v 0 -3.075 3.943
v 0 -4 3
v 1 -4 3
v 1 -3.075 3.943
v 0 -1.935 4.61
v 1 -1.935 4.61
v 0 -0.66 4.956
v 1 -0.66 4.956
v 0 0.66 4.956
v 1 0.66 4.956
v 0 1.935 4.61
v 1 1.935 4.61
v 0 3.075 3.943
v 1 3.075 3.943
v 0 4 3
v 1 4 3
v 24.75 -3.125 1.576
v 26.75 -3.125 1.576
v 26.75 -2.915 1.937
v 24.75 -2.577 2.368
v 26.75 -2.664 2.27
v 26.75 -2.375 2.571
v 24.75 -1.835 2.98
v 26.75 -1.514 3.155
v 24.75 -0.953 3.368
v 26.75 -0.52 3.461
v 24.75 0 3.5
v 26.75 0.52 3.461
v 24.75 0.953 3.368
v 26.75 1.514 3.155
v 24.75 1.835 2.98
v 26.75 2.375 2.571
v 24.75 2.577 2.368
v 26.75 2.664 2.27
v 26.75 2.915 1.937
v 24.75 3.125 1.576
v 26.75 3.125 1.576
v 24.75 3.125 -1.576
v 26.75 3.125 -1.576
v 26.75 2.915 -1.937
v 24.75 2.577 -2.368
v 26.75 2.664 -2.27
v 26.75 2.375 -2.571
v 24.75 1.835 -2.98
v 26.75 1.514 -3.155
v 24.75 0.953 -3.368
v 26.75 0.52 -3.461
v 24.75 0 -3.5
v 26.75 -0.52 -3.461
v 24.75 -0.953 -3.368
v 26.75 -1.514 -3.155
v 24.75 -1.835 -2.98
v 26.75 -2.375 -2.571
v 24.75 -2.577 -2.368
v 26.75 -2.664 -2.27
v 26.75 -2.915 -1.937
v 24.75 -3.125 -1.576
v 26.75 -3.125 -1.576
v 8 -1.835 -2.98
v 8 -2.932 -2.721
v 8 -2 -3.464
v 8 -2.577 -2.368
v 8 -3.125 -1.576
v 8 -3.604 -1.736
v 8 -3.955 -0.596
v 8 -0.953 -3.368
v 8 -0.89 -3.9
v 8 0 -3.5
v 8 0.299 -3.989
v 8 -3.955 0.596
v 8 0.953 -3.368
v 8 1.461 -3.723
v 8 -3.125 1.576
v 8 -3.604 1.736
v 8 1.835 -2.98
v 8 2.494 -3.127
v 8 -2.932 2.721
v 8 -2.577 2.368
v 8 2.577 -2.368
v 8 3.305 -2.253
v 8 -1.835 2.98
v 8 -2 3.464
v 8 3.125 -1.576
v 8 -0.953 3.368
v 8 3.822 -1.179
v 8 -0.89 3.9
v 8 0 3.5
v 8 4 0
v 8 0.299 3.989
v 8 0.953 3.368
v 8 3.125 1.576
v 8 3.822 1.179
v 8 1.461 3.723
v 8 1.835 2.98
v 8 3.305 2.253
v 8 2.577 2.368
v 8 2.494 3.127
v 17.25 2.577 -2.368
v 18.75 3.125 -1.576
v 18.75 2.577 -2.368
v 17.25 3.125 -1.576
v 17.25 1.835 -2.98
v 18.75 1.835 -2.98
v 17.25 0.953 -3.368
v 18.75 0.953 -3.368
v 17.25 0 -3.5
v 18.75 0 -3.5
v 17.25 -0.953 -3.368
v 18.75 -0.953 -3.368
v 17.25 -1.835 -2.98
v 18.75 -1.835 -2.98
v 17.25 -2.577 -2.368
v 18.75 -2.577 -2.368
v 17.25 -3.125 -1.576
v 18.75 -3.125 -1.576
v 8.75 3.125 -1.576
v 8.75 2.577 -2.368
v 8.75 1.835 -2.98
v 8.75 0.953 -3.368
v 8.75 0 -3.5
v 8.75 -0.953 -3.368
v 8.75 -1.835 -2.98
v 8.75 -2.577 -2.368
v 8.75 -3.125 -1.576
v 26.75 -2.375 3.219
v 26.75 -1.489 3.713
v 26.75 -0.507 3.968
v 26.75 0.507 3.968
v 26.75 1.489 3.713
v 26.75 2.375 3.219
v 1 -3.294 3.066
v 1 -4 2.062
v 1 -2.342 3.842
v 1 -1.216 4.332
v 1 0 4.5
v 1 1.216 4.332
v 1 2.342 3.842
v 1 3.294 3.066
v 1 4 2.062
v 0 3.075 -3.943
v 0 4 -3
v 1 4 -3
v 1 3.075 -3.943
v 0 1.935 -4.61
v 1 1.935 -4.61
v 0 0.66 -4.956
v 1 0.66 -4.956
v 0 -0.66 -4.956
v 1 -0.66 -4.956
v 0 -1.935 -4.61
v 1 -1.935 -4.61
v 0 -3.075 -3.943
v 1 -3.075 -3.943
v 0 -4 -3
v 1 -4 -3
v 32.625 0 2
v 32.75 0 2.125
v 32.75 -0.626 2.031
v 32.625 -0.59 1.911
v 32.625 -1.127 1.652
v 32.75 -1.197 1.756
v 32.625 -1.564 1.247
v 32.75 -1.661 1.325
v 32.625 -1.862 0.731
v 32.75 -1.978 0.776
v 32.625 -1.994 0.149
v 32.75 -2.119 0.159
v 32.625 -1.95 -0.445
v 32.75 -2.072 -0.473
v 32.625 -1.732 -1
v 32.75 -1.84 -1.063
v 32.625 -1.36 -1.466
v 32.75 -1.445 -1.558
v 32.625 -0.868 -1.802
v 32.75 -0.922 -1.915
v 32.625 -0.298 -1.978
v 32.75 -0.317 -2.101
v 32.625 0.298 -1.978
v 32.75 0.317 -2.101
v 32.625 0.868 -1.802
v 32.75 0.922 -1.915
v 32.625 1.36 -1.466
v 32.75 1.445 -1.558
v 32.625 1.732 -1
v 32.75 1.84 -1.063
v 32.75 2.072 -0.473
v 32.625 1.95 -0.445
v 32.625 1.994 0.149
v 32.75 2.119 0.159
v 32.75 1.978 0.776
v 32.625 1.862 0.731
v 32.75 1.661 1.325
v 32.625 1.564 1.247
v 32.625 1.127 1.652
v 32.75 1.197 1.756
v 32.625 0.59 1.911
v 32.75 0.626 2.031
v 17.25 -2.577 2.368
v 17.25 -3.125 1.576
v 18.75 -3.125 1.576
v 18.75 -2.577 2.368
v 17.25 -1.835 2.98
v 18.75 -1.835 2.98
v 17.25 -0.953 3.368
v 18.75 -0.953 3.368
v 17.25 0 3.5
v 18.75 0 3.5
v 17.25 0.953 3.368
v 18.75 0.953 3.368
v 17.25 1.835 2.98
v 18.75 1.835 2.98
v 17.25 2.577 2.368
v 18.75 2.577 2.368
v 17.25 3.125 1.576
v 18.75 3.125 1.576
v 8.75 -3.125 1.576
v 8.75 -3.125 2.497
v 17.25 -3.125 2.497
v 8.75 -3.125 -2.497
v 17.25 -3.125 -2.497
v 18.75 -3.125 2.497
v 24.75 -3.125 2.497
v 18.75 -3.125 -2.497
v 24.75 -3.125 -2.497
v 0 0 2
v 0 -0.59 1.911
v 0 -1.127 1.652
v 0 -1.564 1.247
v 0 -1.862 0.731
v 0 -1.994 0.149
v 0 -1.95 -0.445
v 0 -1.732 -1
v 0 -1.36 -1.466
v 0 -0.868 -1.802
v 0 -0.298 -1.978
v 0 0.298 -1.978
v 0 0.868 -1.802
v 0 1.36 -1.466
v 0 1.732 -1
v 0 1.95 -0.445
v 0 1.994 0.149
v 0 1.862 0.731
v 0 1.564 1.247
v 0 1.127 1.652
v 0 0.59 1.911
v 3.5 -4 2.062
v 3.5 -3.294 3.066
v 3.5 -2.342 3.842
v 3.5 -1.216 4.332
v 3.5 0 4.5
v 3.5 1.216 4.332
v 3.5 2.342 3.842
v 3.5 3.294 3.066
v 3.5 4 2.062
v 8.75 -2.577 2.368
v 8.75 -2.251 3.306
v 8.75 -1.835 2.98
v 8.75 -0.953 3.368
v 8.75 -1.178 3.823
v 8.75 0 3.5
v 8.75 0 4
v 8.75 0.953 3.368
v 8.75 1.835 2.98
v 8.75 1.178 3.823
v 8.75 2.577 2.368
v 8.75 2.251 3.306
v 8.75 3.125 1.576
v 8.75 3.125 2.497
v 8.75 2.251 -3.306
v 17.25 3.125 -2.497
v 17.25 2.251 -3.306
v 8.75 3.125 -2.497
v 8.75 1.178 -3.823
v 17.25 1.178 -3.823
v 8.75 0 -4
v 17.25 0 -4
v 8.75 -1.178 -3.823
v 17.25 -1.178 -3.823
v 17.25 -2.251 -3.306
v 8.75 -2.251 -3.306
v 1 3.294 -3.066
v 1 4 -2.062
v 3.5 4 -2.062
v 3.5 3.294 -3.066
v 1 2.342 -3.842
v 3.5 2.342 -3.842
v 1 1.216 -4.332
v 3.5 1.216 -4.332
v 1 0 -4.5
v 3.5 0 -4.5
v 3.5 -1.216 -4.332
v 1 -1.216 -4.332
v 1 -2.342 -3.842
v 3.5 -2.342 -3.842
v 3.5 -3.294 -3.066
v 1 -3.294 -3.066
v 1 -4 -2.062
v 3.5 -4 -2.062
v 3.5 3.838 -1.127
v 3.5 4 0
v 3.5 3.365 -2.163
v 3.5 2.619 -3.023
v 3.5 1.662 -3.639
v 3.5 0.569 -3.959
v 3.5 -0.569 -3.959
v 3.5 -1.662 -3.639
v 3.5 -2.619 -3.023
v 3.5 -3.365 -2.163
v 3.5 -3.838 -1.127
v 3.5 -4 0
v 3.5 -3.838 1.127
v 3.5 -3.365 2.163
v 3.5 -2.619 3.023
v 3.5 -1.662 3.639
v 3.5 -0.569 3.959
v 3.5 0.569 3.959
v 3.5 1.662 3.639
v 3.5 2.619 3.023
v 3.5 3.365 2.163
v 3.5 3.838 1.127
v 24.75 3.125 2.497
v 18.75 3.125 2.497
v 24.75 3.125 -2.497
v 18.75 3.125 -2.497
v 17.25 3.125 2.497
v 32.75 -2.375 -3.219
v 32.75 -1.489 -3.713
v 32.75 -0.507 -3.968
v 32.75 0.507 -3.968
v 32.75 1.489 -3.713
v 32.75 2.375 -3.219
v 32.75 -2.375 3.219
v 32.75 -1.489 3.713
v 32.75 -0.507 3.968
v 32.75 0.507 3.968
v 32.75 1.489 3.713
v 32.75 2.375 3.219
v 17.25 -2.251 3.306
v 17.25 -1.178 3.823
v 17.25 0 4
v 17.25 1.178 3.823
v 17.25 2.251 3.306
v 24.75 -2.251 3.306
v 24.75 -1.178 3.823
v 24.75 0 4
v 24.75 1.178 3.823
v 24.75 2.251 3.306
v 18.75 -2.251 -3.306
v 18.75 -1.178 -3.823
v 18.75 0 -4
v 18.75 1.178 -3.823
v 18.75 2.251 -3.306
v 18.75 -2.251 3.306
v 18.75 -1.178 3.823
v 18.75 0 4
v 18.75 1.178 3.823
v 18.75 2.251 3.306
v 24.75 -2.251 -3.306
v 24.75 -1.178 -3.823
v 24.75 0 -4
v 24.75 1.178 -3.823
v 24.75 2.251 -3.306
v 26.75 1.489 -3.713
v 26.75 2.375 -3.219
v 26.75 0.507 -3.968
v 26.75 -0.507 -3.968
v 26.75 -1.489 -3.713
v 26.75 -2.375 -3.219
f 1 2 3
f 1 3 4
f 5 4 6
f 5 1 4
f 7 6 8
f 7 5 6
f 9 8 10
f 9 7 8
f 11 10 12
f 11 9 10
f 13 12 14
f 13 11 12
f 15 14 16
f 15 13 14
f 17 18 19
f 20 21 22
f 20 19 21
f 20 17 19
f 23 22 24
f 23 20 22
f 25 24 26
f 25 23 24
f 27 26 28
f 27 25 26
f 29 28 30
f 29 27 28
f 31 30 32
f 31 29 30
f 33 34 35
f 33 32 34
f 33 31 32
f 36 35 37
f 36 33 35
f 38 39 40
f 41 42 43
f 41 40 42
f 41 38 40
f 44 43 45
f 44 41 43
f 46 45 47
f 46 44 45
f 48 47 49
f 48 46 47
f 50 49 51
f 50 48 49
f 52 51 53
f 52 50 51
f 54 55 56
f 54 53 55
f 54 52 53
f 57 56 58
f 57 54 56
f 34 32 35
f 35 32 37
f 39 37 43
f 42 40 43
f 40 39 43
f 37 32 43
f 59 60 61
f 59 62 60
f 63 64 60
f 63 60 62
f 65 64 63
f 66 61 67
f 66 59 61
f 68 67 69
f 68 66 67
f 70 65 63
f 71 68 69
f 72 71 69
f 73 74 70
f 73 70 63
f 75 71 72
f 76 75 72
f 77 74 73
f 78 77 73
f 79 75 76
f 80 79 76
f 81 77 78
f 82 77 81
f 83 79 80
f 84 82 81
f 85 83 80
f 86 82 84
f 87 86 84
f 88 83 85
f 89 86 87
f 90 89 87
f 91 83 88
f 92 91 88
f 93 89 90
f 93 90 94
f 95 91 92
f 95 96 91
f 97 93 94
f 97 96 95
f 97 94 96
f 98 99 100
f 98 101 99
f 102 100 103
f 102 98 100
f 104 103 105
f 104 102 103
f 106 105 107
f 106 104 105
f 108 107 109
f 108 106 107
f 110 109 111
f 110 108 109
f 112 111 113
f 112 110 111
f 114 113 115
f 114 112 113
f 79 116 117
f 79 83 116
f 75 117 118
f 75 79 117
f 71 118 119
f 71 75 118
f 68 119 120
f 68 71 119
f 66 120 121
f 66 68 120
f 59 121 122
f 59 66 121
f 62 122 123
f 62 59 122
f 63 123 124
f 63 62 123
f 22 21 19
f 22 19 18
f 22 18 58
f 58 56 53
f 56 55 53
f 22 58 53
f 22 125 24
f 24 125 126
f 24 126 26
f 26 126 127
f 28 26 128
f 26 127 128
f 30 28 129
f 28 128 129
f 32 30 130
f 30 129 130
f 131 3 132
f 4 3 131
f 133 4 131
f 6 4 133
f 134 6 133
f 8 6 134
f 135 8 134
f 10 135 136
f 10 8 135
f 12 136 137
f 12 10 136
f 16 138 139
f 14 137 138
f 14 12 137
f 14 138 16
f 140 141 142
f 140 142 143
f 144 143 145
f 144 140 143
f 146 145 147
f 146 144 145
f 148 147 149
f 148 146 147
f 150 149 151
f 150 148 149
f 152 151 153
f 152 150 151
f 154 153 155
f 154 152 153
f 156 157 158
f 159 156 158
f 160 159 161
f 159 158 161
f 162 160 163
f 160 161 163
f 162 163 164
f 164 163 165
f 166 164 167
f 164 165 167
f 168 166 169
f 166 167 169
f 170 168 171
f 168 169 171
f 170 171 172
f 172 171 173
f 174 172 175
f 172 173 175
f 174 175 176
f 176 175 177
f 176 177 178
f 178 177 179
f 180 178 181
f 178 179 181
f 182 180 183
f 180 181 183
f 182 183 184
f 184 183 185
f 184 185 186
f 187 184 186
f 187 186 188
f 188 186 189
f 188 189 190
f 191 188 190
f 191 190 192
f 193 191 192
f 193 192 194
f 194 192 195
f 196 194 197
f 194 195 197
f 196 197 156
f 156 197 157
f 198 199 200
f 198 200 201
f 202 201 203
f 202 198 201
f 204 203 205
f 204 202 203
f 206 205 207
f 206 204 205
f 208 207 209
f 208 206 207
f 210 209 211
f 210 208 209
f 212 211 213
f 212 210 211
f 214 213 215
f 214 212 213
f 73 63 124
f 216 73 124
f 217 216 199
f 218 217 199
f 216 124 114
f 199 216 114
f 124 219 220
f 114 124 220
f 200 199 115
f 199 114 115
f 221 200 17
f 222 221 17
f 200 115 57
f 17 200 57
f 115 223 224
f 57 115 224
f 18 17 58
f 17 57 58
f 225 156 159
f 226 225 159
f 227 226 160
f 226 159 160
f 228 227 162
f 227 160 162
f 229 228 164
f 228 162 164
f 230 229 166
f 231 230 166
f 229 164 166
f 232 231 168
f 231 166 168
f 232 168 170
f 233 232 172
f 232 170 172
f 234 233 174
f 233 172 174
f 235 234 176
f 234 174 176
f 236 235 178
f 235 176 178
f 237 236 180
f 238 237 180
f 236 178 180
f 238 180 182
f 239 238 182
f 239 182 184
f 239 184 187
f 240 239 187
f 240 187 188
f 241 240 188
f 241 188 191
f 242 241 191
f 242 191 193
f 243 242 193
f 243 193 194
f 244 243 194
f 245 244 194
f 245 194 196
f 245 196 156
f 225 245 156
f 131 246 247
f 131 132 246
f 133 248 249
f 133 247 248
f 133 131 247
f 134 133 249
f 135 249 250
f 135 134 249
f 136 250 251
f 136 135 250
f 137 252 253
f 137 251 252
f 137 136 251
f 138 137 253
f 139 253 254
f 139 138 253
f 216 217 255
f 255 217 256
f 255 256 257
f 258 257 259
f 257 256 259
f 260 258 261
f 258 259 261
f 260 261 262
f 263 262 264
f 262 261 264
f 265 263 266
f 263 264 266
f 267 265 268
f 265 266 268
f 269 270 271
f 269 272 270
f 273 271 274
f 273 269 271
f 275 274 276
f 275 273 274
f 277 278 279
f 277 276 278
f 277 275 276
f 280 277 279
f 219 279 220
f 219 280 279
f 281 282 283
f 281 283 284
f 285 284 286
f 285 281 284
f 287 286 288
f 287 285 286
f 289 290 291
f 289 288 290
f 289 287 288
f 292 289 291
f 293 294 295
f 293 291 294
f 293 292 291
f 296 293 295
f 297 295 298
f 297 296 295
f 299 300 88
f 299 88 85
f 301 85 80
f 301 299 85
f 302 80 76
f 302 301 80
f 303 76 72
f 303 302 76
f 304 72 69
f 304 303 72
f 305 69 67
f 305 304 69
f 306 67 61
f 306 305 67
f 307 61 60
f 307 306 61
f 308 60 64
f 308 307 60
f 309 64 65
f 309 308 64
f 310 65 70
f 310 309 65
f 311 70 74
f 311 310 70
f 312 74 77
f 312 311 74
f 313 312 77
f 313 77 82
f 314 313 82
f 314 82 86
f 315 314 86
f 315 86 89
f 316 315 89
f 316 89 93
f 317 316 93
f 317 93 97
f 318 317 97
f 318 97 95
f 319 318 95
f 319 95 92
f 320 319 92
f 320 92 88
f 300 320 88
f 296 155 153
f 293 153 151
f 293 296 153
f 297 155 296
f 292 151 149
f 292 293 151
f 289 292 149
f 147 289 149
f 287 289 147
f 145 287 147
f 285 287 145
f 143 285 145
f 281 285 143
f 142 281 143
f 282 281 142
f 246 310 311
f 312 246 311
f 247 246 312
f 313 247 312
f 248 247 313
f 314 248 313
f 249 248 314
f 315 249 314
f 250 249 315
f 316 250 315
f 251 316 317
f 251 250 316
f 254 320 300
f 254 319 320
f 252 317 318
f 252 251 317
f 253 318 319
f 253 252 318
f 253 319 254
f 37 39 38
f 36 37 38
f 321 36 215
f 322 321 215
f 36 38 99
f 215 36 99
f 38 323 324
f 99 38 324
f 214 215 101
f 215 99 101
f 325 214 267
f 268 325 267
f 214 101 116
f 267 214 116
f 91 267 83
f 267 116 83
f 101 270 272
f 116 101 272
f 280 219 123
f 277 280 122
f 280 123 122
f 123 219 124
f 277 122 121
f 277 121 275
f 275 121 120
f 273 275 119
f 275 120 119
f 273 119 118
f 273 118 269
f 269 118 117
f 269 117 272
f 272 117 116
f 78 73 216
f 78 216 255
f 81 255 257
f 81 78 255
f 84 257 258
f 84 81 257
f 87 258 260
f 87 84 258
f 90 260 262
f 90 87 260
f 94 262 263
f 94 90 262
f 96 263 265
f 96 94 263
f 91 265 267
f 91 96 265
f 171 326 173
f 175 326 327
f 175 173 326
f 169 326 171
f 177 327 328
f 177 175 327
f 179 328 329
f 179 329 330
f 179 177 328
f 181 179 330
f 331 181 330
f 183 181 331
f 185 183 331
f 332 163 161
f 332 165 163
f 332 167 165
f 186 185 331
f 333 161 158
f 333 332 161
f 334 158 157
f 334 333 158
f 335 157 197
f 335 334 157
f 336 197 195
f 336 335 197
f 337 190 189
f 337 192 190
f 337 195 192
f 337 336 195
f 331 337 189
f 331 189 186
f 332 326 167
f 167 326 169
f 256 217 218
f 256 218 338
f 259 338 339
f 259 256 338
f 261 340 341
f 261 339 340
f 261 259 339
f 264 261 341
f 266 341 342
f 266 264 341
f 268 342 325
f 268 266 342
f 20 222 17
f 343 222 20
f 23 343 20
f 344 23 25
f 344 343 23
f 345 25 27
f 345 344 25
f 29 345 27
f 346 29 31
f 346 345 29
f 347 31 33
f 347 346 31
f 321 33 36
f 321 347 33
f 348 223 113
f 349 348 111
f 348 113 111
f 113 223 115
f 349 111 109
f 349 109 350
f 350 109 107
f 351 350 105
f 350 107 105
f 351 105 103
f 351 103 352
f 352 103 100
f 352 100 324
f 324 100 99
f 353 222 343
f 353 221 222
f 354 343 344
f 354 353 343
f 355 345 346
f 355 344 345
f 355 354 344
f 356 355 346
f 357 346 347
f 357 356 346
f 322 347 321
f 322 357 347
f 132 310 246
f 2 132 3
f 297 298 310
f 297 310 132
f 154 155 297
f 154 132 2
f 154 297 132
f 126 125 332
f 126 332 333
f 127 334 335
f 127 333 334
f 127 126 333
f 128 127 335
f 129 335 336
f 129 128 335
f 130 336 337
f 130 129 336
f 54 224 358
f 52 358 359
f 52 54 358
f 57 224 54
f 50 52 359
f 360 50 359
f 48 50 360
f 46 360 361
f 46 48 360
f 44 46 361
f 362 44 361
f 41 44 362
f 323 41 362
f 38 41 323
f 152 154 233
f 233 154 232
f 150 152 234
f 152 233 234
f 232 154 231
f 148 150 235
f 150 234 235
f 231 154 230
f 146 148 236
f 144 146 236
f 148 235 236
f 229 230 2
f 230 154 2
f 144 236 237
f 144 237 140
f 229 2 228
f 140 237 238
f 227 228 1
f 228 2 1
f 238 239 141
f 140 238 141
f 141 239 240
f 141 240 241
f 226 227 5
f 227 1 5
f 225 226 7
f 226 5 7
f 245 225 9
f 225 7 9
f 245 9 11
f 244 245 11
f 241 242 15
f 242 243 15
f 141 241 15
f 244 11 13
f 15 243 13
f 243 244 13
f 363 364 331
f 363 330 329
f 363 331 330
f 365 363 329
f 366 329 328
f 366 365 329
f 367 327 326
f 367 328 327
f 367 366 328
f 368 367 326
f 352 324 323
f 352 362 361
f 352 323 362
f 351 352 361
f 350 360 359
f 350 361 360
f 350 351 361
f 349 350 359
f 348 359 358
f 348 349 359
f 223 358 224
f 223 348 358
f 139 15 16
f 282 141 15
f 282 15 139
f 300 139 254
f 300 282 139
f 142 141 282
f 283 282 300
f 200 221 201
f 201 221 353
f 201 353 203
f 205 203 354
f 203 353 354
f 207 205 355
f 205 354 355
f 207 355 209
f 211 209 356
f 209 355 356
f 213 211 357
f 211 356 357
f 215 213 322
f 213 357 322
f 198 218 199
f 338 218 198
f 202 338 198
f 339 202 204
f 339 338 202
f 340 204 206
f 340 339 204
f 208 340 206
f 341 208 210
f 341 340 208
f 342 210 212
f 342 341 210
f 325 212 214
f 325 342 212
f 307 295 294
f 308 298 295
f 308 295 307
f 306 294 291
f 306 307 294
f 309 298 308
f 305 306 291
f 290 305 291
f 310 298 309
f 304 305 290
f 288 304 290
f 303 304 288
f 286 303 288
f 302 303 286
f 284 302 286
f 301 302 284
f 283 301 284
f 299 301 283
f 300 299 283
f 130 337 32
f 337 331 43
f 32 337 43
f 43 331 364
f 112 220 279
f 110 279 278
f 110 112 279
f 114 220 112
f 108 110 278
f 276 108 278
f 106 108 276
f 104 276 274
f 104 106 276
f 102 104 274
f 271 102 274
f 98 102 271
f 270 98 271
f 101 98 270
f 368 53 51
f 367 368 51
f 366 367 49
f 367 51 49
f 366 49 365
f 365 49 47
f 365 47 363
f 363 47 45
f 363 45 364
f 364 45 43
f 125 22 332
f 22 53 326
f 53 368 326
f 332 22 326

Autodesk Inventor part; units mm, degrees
ref_plane "YZ Plane" through (0, 0, 0) normal (1, 0, 0) x (0, 1, 0)
ref_plane "XZ Plane" through (0, 0, 0) normal (0, 1, 0) x (-1, 0, 0)
ref_plane "XY Plane" through (0, 0, 0) normal (0, 0, 1) x (1, 0, 0)
sketch "Sketch1" plane through (0, 0, 0) normal (0, 0, 1) x (1, 0, 0)
  line L0 (0, 0) -> (1, 0)
  line L1 (1, 0) -> (1, 5)
  line L2 (1, 5) -> (0, 5)
  line L3 (0, 5) -> (0, 0)
  line L4 (1, 0) -> (3.5, 0)
  line L5 (3.5, 0) -> (3.5, 4.5)
  line L6 (3.5, 4.5) -> (1, 4.5)
  line L7 (1, 4.5) -> (1, 0)
  line L8 (8.75, 0) -> (17.25, 0)
  line L9 (17.25, 0) -> (17.25, 4)
  line L10 (17.25, 4) -> (8.75, 4)
  line L11 (8.75, 4) -> (8.75, 0)
  line L12 (17.25, 0) -> (18.75, 0)
  line L13 (18.75, 0) -> (18.75, 3.5)
  line L14 (18.75, 3.5) -> (17.25, 3.5)
  line L15 (17.25, 3.5) -> (17.25, 0)
  line L16 (18.75, 0) -> (24.75, 0)
  line L17 (24.75, 0) -> (24.75, 4)
  line L18 (24.75, 4) -> (18.75, 4)
  line L19 (18.75, 4) -> (18.75, 0)
  line L20 (24.75, 0) -> (26.75, 0)
  line L21 (26.75, 0) -> (26.75, 3.5)
  line L22 (26.75, 3.5) -> (24.75, 3.5)
  line L23 (24.75, 3.5) -> (24.75, 0)
  line L24 (26.75, 0) -> (32.75, 0)
  line L25 (32.75, 0) -> (32.75, 4)
  line L26 (32.75, 4) -> (26.75, 4)
  line L27 (26.75, 4) -> (26.75, 0)
  line L28 (3.5, 0) -> (8, 0)
  line L29 (8, 0) -> (8, 4)
  line L30 (8, 4) -> (3.5, 4)
  line L31 (3.5, 4) -> (3.5, 0)
  line L32 (8, 0) -> (8.75, 0)
  line L33 (8.75, 0) -> (8.75, 3.5)
  line L34 (8.75, 3.5) -> (8, 3.5)
  line L35 (8, 3.5) -> (8, 0)
  dimension "d0" = 1
  dimension "d1" = 3.5
  dimension "d2" = 32.75
  dimension "d3" = 2
  dimension "d5" = 24.75
  dimension "d6" = 1.5
  dimension "d7" = 17.25
  dimension "d9" = 8
  dimension "d10" = 0.75
  dimension "d11" = 8
  dimension "d12" = 7
  dimension "d13" = 10
  dimension "d14" = 9
  dimension "d15" = 8
revolve "Revolution1" add sketch "Sketch1" angle 360 about axis through (1, 0, 0) along (1, 0, 0)
thread "Thread1" size "M8x1" class "6g" standard "ANSI Metric M Profile" full length
thread "Thread2" size "M8x1.25" class "6g" standard "ANSI Metric M Profile" full length
sketch "Sketch2" plane through (0, 0, 0) normal (0, 0, 1) x (1, 0, 0)
  line L0 (32.75, 2.375) -> (26.75, 2.375)
  line L1 (26.75, 2.375) -> (26.75, 3.125)
  line L2 (26.75, 3.125) -> (8, 3.125)
  line L3 (8, 3.125) -> (8, 5)
  line L4 (8, 5) -> (32.75, 5)
  line L5 (32.75, 5) -> (32.75, 2.375)
  line L6 (0, 4) -> (4, 4)
  line L7 (4, 4) -> (4, 5)
  line L8 (4, 5) -> (0, 5)
  line L9 (0, 5) -> (0, 4)
  point P0 (0, 0)
  dimension "d21" = 4
  dimension "d22" = 4
  dimension "d23" = 1
  dimension "d24" = 2.375
  dimension "d25" = 32.75
  dimension "d26" = 3.125
  dimension "d27" = 8
  dimension "d28" = 26.75
extrude "Extrusion1" cut sketch "Sketch2" along normal mid plane 10
mirror "Mirror1" about plane through (0, 0, 0) normal (0, 1, 0) of "Extrusion1"
hole "Hole1" at (0, 0, 0) direction (1, 0, 0) diameter 4 end through all
chamfer "Chamfer1" distance 0.125 angle 45 1 edges at (32.75, 0, -2)
properties part number "404-01" material "Brass, Soft Yellow"
